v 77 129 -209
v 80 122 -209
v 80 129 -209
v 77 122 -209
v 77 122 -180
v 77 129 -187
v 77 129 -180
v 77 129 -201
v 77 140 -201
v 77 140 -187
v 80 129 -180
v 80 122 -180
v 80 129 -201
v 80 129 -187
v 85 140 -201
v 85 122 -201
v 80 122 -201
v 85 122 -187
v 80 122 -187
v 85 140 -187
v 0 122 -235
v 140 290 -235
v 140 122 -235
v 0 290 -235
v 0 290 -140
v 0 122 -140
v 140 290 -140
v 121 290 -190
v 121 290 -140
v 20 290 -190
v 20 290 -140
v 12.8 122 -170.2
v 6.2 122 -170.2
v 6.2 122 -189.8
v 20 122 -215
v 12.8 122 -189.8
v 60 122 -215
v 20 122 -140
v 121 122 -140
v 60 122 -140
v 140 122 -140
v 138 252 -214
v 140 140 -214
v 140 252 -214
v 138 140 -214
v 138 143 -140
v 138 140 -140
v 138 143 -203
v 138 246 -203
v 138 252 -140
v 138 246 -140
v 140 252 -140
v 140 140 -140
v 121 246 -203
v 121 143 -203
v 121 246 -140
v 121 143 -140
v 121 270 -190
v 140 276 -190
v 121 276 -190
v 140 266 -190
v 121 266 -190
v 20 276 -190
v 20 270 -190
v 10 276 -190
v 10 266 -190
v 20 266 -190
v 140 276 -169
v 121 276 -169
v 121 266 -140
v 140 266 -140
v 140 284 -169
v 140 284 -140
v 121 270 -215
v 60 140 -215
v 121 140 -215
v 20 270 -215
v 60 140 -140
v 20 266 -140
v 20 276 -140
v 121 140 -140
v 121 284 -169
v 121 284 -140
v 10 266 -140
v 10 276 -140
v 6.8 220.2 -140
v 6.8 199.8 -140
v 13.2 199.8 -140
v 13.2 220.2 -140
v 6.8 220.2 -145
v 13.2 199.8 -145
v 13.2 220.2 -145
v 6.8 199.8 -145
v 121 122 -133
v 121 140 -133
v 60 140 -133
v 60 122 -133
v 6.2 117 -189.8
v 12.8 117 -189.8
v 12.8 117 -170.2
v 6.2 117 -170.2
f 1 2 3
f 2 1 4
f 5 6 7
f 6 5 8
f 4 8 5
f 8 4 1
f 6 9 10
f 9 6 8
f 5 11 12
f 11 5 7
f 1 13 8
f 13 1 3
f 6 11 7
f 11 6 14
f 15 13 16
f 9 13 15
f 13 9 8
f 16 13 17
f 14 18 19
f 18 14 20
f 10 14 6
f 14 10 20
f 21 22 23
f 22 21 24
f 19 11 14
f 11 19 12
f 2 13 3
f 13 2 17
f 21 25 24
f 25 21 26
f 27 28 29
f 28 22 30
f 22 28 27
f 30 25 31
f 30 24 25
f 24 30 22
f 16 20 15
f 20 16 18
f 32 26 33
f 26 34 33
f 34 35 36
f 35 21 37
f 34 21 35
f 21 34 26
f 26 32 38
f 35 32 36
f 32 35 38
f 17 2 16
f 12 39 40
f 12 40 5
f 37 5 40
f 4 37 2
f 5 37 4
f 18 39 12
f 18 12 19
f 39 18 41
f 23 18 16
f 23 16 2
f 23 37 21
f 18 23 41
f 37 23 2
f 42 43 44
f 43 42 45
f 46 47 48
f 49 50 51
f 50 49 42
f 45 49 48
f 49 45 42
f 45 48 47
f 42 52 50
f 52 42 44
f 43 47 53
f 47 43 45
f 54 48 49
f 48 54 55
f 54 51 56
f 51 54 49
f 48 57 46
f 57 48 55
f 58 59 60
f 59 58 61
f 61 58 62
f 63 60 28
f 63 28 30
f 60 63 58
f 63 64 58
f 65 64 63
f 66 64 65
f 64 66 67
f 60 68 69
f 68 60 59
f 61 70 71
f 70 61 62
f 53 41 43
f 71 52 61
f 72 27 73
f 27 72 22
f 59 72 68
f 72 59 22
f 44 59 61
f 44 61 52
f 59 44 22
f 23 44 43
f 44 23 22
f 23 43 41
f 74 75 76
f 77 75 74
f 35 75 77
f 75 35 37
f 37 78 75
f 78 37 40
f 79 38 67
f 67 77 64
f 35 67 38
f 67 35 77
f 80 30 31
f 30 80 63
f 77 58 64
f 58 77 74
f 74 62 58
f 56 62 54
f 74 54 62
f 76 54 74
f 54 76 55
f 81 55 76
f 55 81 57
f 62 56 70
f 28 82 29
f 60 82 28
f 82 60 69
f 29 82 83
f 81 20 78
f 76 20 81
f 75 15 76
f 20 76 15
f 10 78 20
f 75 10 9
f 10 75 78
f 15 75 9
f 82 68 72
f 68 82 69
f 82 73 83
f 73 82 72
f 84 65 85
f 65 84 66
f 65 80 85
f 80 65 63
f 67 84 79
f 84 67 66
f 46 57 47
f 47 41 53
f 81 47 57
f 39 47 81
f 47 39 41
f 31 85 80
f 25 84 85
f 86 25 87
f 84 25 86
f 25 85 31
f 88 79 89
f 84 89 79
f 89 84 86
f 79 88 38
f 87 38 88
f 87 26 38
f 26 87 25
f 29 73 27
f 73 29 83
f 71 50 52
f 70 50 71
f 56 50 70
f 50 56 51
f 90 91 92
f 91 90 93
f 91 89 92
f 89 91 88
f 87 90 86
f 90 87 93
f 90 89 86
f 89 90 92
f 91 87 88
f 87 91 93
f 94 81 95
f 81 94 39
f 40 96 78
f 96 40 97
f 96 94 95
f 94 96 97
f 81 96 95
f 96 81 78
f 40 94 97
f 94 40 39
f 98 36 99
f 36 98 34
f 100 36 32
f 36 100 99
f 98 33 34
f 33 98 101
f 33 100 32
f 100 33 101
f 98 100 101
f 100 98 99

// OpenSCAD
rotate(a=90,v=[0,1,0]) {
difference() {
    union() {
        difference() {
            cube([235,290,80]); // bottom
            
            union() {
                translate([168,20,78])
                cube([53,74,3]);    // nfc
                translate([180,94,77])
                cube([29,35,4]);    // nfc module
                translate([187,122,77])
                cube([14,20,4]);    // nfc line
                
                translate([50,-1,30])
                cube([57,11,5]);    // printer
            }
        }
        
        translate([0,60,80])
        rotate(a=90,v=[0,1,0]) {
            cylinder(r=60,h=140,$fn=50);    // front
        }
        
        difference() {
            translate([0,60,80])
            cube([140,65,60]);  // front2
        }
        
        difference() {
            translate([0,122,80])
            cube([235,168,60]); // back
            
            union() {
                translate([187,122,79])
                cube([14,20,6]);    // nfc line2
                
                translate([21,140,138])
                cube([193,112,3]);  // lcd
                translate([35,143,120])
                cube([168,103,20]);  // lcd bottom
                // translate([91,172,120])
                // cube([65,56,15]);   // lcd module
                translate([97,140,130])
                cube([40,32,10]);    // lcd line
                
                translate([45,266,120])
                cube([145,10,21]);  // back lid
            }
        }
    }
    
    union() {
        translate([20,10,20])
        cube([195,260,40]); // inside bottom
        
        translate([20,10,60])
        cube([113,130,27]); // inside printer
        translate([20,140,60])
        cube([195,130,61]); // inside lcd
        
        translate([45,266,20])
        cube([145,25,101]); // inside back lid
        translate([139,275,120])
        cube([30,9,21]);    // inside pan
        translate([45,266,10])
        cube([145,10,11]);  // inside bottom lid
        
        translate([-1,-1,-1])
        cube([141,292,142]);
        translate([140,-1,-1])
        cube([96,123,142]);
        
        translate([139,199.8,6.8])
        cube([6,20.4,6.4]);        // in
    }
}
translate([133,122,60])
cube([7,18,61]);   // 133+7,10+130,60+27

translate([170.2,117,6.2])
cube([19.6,6,6.6]);     // on
}
